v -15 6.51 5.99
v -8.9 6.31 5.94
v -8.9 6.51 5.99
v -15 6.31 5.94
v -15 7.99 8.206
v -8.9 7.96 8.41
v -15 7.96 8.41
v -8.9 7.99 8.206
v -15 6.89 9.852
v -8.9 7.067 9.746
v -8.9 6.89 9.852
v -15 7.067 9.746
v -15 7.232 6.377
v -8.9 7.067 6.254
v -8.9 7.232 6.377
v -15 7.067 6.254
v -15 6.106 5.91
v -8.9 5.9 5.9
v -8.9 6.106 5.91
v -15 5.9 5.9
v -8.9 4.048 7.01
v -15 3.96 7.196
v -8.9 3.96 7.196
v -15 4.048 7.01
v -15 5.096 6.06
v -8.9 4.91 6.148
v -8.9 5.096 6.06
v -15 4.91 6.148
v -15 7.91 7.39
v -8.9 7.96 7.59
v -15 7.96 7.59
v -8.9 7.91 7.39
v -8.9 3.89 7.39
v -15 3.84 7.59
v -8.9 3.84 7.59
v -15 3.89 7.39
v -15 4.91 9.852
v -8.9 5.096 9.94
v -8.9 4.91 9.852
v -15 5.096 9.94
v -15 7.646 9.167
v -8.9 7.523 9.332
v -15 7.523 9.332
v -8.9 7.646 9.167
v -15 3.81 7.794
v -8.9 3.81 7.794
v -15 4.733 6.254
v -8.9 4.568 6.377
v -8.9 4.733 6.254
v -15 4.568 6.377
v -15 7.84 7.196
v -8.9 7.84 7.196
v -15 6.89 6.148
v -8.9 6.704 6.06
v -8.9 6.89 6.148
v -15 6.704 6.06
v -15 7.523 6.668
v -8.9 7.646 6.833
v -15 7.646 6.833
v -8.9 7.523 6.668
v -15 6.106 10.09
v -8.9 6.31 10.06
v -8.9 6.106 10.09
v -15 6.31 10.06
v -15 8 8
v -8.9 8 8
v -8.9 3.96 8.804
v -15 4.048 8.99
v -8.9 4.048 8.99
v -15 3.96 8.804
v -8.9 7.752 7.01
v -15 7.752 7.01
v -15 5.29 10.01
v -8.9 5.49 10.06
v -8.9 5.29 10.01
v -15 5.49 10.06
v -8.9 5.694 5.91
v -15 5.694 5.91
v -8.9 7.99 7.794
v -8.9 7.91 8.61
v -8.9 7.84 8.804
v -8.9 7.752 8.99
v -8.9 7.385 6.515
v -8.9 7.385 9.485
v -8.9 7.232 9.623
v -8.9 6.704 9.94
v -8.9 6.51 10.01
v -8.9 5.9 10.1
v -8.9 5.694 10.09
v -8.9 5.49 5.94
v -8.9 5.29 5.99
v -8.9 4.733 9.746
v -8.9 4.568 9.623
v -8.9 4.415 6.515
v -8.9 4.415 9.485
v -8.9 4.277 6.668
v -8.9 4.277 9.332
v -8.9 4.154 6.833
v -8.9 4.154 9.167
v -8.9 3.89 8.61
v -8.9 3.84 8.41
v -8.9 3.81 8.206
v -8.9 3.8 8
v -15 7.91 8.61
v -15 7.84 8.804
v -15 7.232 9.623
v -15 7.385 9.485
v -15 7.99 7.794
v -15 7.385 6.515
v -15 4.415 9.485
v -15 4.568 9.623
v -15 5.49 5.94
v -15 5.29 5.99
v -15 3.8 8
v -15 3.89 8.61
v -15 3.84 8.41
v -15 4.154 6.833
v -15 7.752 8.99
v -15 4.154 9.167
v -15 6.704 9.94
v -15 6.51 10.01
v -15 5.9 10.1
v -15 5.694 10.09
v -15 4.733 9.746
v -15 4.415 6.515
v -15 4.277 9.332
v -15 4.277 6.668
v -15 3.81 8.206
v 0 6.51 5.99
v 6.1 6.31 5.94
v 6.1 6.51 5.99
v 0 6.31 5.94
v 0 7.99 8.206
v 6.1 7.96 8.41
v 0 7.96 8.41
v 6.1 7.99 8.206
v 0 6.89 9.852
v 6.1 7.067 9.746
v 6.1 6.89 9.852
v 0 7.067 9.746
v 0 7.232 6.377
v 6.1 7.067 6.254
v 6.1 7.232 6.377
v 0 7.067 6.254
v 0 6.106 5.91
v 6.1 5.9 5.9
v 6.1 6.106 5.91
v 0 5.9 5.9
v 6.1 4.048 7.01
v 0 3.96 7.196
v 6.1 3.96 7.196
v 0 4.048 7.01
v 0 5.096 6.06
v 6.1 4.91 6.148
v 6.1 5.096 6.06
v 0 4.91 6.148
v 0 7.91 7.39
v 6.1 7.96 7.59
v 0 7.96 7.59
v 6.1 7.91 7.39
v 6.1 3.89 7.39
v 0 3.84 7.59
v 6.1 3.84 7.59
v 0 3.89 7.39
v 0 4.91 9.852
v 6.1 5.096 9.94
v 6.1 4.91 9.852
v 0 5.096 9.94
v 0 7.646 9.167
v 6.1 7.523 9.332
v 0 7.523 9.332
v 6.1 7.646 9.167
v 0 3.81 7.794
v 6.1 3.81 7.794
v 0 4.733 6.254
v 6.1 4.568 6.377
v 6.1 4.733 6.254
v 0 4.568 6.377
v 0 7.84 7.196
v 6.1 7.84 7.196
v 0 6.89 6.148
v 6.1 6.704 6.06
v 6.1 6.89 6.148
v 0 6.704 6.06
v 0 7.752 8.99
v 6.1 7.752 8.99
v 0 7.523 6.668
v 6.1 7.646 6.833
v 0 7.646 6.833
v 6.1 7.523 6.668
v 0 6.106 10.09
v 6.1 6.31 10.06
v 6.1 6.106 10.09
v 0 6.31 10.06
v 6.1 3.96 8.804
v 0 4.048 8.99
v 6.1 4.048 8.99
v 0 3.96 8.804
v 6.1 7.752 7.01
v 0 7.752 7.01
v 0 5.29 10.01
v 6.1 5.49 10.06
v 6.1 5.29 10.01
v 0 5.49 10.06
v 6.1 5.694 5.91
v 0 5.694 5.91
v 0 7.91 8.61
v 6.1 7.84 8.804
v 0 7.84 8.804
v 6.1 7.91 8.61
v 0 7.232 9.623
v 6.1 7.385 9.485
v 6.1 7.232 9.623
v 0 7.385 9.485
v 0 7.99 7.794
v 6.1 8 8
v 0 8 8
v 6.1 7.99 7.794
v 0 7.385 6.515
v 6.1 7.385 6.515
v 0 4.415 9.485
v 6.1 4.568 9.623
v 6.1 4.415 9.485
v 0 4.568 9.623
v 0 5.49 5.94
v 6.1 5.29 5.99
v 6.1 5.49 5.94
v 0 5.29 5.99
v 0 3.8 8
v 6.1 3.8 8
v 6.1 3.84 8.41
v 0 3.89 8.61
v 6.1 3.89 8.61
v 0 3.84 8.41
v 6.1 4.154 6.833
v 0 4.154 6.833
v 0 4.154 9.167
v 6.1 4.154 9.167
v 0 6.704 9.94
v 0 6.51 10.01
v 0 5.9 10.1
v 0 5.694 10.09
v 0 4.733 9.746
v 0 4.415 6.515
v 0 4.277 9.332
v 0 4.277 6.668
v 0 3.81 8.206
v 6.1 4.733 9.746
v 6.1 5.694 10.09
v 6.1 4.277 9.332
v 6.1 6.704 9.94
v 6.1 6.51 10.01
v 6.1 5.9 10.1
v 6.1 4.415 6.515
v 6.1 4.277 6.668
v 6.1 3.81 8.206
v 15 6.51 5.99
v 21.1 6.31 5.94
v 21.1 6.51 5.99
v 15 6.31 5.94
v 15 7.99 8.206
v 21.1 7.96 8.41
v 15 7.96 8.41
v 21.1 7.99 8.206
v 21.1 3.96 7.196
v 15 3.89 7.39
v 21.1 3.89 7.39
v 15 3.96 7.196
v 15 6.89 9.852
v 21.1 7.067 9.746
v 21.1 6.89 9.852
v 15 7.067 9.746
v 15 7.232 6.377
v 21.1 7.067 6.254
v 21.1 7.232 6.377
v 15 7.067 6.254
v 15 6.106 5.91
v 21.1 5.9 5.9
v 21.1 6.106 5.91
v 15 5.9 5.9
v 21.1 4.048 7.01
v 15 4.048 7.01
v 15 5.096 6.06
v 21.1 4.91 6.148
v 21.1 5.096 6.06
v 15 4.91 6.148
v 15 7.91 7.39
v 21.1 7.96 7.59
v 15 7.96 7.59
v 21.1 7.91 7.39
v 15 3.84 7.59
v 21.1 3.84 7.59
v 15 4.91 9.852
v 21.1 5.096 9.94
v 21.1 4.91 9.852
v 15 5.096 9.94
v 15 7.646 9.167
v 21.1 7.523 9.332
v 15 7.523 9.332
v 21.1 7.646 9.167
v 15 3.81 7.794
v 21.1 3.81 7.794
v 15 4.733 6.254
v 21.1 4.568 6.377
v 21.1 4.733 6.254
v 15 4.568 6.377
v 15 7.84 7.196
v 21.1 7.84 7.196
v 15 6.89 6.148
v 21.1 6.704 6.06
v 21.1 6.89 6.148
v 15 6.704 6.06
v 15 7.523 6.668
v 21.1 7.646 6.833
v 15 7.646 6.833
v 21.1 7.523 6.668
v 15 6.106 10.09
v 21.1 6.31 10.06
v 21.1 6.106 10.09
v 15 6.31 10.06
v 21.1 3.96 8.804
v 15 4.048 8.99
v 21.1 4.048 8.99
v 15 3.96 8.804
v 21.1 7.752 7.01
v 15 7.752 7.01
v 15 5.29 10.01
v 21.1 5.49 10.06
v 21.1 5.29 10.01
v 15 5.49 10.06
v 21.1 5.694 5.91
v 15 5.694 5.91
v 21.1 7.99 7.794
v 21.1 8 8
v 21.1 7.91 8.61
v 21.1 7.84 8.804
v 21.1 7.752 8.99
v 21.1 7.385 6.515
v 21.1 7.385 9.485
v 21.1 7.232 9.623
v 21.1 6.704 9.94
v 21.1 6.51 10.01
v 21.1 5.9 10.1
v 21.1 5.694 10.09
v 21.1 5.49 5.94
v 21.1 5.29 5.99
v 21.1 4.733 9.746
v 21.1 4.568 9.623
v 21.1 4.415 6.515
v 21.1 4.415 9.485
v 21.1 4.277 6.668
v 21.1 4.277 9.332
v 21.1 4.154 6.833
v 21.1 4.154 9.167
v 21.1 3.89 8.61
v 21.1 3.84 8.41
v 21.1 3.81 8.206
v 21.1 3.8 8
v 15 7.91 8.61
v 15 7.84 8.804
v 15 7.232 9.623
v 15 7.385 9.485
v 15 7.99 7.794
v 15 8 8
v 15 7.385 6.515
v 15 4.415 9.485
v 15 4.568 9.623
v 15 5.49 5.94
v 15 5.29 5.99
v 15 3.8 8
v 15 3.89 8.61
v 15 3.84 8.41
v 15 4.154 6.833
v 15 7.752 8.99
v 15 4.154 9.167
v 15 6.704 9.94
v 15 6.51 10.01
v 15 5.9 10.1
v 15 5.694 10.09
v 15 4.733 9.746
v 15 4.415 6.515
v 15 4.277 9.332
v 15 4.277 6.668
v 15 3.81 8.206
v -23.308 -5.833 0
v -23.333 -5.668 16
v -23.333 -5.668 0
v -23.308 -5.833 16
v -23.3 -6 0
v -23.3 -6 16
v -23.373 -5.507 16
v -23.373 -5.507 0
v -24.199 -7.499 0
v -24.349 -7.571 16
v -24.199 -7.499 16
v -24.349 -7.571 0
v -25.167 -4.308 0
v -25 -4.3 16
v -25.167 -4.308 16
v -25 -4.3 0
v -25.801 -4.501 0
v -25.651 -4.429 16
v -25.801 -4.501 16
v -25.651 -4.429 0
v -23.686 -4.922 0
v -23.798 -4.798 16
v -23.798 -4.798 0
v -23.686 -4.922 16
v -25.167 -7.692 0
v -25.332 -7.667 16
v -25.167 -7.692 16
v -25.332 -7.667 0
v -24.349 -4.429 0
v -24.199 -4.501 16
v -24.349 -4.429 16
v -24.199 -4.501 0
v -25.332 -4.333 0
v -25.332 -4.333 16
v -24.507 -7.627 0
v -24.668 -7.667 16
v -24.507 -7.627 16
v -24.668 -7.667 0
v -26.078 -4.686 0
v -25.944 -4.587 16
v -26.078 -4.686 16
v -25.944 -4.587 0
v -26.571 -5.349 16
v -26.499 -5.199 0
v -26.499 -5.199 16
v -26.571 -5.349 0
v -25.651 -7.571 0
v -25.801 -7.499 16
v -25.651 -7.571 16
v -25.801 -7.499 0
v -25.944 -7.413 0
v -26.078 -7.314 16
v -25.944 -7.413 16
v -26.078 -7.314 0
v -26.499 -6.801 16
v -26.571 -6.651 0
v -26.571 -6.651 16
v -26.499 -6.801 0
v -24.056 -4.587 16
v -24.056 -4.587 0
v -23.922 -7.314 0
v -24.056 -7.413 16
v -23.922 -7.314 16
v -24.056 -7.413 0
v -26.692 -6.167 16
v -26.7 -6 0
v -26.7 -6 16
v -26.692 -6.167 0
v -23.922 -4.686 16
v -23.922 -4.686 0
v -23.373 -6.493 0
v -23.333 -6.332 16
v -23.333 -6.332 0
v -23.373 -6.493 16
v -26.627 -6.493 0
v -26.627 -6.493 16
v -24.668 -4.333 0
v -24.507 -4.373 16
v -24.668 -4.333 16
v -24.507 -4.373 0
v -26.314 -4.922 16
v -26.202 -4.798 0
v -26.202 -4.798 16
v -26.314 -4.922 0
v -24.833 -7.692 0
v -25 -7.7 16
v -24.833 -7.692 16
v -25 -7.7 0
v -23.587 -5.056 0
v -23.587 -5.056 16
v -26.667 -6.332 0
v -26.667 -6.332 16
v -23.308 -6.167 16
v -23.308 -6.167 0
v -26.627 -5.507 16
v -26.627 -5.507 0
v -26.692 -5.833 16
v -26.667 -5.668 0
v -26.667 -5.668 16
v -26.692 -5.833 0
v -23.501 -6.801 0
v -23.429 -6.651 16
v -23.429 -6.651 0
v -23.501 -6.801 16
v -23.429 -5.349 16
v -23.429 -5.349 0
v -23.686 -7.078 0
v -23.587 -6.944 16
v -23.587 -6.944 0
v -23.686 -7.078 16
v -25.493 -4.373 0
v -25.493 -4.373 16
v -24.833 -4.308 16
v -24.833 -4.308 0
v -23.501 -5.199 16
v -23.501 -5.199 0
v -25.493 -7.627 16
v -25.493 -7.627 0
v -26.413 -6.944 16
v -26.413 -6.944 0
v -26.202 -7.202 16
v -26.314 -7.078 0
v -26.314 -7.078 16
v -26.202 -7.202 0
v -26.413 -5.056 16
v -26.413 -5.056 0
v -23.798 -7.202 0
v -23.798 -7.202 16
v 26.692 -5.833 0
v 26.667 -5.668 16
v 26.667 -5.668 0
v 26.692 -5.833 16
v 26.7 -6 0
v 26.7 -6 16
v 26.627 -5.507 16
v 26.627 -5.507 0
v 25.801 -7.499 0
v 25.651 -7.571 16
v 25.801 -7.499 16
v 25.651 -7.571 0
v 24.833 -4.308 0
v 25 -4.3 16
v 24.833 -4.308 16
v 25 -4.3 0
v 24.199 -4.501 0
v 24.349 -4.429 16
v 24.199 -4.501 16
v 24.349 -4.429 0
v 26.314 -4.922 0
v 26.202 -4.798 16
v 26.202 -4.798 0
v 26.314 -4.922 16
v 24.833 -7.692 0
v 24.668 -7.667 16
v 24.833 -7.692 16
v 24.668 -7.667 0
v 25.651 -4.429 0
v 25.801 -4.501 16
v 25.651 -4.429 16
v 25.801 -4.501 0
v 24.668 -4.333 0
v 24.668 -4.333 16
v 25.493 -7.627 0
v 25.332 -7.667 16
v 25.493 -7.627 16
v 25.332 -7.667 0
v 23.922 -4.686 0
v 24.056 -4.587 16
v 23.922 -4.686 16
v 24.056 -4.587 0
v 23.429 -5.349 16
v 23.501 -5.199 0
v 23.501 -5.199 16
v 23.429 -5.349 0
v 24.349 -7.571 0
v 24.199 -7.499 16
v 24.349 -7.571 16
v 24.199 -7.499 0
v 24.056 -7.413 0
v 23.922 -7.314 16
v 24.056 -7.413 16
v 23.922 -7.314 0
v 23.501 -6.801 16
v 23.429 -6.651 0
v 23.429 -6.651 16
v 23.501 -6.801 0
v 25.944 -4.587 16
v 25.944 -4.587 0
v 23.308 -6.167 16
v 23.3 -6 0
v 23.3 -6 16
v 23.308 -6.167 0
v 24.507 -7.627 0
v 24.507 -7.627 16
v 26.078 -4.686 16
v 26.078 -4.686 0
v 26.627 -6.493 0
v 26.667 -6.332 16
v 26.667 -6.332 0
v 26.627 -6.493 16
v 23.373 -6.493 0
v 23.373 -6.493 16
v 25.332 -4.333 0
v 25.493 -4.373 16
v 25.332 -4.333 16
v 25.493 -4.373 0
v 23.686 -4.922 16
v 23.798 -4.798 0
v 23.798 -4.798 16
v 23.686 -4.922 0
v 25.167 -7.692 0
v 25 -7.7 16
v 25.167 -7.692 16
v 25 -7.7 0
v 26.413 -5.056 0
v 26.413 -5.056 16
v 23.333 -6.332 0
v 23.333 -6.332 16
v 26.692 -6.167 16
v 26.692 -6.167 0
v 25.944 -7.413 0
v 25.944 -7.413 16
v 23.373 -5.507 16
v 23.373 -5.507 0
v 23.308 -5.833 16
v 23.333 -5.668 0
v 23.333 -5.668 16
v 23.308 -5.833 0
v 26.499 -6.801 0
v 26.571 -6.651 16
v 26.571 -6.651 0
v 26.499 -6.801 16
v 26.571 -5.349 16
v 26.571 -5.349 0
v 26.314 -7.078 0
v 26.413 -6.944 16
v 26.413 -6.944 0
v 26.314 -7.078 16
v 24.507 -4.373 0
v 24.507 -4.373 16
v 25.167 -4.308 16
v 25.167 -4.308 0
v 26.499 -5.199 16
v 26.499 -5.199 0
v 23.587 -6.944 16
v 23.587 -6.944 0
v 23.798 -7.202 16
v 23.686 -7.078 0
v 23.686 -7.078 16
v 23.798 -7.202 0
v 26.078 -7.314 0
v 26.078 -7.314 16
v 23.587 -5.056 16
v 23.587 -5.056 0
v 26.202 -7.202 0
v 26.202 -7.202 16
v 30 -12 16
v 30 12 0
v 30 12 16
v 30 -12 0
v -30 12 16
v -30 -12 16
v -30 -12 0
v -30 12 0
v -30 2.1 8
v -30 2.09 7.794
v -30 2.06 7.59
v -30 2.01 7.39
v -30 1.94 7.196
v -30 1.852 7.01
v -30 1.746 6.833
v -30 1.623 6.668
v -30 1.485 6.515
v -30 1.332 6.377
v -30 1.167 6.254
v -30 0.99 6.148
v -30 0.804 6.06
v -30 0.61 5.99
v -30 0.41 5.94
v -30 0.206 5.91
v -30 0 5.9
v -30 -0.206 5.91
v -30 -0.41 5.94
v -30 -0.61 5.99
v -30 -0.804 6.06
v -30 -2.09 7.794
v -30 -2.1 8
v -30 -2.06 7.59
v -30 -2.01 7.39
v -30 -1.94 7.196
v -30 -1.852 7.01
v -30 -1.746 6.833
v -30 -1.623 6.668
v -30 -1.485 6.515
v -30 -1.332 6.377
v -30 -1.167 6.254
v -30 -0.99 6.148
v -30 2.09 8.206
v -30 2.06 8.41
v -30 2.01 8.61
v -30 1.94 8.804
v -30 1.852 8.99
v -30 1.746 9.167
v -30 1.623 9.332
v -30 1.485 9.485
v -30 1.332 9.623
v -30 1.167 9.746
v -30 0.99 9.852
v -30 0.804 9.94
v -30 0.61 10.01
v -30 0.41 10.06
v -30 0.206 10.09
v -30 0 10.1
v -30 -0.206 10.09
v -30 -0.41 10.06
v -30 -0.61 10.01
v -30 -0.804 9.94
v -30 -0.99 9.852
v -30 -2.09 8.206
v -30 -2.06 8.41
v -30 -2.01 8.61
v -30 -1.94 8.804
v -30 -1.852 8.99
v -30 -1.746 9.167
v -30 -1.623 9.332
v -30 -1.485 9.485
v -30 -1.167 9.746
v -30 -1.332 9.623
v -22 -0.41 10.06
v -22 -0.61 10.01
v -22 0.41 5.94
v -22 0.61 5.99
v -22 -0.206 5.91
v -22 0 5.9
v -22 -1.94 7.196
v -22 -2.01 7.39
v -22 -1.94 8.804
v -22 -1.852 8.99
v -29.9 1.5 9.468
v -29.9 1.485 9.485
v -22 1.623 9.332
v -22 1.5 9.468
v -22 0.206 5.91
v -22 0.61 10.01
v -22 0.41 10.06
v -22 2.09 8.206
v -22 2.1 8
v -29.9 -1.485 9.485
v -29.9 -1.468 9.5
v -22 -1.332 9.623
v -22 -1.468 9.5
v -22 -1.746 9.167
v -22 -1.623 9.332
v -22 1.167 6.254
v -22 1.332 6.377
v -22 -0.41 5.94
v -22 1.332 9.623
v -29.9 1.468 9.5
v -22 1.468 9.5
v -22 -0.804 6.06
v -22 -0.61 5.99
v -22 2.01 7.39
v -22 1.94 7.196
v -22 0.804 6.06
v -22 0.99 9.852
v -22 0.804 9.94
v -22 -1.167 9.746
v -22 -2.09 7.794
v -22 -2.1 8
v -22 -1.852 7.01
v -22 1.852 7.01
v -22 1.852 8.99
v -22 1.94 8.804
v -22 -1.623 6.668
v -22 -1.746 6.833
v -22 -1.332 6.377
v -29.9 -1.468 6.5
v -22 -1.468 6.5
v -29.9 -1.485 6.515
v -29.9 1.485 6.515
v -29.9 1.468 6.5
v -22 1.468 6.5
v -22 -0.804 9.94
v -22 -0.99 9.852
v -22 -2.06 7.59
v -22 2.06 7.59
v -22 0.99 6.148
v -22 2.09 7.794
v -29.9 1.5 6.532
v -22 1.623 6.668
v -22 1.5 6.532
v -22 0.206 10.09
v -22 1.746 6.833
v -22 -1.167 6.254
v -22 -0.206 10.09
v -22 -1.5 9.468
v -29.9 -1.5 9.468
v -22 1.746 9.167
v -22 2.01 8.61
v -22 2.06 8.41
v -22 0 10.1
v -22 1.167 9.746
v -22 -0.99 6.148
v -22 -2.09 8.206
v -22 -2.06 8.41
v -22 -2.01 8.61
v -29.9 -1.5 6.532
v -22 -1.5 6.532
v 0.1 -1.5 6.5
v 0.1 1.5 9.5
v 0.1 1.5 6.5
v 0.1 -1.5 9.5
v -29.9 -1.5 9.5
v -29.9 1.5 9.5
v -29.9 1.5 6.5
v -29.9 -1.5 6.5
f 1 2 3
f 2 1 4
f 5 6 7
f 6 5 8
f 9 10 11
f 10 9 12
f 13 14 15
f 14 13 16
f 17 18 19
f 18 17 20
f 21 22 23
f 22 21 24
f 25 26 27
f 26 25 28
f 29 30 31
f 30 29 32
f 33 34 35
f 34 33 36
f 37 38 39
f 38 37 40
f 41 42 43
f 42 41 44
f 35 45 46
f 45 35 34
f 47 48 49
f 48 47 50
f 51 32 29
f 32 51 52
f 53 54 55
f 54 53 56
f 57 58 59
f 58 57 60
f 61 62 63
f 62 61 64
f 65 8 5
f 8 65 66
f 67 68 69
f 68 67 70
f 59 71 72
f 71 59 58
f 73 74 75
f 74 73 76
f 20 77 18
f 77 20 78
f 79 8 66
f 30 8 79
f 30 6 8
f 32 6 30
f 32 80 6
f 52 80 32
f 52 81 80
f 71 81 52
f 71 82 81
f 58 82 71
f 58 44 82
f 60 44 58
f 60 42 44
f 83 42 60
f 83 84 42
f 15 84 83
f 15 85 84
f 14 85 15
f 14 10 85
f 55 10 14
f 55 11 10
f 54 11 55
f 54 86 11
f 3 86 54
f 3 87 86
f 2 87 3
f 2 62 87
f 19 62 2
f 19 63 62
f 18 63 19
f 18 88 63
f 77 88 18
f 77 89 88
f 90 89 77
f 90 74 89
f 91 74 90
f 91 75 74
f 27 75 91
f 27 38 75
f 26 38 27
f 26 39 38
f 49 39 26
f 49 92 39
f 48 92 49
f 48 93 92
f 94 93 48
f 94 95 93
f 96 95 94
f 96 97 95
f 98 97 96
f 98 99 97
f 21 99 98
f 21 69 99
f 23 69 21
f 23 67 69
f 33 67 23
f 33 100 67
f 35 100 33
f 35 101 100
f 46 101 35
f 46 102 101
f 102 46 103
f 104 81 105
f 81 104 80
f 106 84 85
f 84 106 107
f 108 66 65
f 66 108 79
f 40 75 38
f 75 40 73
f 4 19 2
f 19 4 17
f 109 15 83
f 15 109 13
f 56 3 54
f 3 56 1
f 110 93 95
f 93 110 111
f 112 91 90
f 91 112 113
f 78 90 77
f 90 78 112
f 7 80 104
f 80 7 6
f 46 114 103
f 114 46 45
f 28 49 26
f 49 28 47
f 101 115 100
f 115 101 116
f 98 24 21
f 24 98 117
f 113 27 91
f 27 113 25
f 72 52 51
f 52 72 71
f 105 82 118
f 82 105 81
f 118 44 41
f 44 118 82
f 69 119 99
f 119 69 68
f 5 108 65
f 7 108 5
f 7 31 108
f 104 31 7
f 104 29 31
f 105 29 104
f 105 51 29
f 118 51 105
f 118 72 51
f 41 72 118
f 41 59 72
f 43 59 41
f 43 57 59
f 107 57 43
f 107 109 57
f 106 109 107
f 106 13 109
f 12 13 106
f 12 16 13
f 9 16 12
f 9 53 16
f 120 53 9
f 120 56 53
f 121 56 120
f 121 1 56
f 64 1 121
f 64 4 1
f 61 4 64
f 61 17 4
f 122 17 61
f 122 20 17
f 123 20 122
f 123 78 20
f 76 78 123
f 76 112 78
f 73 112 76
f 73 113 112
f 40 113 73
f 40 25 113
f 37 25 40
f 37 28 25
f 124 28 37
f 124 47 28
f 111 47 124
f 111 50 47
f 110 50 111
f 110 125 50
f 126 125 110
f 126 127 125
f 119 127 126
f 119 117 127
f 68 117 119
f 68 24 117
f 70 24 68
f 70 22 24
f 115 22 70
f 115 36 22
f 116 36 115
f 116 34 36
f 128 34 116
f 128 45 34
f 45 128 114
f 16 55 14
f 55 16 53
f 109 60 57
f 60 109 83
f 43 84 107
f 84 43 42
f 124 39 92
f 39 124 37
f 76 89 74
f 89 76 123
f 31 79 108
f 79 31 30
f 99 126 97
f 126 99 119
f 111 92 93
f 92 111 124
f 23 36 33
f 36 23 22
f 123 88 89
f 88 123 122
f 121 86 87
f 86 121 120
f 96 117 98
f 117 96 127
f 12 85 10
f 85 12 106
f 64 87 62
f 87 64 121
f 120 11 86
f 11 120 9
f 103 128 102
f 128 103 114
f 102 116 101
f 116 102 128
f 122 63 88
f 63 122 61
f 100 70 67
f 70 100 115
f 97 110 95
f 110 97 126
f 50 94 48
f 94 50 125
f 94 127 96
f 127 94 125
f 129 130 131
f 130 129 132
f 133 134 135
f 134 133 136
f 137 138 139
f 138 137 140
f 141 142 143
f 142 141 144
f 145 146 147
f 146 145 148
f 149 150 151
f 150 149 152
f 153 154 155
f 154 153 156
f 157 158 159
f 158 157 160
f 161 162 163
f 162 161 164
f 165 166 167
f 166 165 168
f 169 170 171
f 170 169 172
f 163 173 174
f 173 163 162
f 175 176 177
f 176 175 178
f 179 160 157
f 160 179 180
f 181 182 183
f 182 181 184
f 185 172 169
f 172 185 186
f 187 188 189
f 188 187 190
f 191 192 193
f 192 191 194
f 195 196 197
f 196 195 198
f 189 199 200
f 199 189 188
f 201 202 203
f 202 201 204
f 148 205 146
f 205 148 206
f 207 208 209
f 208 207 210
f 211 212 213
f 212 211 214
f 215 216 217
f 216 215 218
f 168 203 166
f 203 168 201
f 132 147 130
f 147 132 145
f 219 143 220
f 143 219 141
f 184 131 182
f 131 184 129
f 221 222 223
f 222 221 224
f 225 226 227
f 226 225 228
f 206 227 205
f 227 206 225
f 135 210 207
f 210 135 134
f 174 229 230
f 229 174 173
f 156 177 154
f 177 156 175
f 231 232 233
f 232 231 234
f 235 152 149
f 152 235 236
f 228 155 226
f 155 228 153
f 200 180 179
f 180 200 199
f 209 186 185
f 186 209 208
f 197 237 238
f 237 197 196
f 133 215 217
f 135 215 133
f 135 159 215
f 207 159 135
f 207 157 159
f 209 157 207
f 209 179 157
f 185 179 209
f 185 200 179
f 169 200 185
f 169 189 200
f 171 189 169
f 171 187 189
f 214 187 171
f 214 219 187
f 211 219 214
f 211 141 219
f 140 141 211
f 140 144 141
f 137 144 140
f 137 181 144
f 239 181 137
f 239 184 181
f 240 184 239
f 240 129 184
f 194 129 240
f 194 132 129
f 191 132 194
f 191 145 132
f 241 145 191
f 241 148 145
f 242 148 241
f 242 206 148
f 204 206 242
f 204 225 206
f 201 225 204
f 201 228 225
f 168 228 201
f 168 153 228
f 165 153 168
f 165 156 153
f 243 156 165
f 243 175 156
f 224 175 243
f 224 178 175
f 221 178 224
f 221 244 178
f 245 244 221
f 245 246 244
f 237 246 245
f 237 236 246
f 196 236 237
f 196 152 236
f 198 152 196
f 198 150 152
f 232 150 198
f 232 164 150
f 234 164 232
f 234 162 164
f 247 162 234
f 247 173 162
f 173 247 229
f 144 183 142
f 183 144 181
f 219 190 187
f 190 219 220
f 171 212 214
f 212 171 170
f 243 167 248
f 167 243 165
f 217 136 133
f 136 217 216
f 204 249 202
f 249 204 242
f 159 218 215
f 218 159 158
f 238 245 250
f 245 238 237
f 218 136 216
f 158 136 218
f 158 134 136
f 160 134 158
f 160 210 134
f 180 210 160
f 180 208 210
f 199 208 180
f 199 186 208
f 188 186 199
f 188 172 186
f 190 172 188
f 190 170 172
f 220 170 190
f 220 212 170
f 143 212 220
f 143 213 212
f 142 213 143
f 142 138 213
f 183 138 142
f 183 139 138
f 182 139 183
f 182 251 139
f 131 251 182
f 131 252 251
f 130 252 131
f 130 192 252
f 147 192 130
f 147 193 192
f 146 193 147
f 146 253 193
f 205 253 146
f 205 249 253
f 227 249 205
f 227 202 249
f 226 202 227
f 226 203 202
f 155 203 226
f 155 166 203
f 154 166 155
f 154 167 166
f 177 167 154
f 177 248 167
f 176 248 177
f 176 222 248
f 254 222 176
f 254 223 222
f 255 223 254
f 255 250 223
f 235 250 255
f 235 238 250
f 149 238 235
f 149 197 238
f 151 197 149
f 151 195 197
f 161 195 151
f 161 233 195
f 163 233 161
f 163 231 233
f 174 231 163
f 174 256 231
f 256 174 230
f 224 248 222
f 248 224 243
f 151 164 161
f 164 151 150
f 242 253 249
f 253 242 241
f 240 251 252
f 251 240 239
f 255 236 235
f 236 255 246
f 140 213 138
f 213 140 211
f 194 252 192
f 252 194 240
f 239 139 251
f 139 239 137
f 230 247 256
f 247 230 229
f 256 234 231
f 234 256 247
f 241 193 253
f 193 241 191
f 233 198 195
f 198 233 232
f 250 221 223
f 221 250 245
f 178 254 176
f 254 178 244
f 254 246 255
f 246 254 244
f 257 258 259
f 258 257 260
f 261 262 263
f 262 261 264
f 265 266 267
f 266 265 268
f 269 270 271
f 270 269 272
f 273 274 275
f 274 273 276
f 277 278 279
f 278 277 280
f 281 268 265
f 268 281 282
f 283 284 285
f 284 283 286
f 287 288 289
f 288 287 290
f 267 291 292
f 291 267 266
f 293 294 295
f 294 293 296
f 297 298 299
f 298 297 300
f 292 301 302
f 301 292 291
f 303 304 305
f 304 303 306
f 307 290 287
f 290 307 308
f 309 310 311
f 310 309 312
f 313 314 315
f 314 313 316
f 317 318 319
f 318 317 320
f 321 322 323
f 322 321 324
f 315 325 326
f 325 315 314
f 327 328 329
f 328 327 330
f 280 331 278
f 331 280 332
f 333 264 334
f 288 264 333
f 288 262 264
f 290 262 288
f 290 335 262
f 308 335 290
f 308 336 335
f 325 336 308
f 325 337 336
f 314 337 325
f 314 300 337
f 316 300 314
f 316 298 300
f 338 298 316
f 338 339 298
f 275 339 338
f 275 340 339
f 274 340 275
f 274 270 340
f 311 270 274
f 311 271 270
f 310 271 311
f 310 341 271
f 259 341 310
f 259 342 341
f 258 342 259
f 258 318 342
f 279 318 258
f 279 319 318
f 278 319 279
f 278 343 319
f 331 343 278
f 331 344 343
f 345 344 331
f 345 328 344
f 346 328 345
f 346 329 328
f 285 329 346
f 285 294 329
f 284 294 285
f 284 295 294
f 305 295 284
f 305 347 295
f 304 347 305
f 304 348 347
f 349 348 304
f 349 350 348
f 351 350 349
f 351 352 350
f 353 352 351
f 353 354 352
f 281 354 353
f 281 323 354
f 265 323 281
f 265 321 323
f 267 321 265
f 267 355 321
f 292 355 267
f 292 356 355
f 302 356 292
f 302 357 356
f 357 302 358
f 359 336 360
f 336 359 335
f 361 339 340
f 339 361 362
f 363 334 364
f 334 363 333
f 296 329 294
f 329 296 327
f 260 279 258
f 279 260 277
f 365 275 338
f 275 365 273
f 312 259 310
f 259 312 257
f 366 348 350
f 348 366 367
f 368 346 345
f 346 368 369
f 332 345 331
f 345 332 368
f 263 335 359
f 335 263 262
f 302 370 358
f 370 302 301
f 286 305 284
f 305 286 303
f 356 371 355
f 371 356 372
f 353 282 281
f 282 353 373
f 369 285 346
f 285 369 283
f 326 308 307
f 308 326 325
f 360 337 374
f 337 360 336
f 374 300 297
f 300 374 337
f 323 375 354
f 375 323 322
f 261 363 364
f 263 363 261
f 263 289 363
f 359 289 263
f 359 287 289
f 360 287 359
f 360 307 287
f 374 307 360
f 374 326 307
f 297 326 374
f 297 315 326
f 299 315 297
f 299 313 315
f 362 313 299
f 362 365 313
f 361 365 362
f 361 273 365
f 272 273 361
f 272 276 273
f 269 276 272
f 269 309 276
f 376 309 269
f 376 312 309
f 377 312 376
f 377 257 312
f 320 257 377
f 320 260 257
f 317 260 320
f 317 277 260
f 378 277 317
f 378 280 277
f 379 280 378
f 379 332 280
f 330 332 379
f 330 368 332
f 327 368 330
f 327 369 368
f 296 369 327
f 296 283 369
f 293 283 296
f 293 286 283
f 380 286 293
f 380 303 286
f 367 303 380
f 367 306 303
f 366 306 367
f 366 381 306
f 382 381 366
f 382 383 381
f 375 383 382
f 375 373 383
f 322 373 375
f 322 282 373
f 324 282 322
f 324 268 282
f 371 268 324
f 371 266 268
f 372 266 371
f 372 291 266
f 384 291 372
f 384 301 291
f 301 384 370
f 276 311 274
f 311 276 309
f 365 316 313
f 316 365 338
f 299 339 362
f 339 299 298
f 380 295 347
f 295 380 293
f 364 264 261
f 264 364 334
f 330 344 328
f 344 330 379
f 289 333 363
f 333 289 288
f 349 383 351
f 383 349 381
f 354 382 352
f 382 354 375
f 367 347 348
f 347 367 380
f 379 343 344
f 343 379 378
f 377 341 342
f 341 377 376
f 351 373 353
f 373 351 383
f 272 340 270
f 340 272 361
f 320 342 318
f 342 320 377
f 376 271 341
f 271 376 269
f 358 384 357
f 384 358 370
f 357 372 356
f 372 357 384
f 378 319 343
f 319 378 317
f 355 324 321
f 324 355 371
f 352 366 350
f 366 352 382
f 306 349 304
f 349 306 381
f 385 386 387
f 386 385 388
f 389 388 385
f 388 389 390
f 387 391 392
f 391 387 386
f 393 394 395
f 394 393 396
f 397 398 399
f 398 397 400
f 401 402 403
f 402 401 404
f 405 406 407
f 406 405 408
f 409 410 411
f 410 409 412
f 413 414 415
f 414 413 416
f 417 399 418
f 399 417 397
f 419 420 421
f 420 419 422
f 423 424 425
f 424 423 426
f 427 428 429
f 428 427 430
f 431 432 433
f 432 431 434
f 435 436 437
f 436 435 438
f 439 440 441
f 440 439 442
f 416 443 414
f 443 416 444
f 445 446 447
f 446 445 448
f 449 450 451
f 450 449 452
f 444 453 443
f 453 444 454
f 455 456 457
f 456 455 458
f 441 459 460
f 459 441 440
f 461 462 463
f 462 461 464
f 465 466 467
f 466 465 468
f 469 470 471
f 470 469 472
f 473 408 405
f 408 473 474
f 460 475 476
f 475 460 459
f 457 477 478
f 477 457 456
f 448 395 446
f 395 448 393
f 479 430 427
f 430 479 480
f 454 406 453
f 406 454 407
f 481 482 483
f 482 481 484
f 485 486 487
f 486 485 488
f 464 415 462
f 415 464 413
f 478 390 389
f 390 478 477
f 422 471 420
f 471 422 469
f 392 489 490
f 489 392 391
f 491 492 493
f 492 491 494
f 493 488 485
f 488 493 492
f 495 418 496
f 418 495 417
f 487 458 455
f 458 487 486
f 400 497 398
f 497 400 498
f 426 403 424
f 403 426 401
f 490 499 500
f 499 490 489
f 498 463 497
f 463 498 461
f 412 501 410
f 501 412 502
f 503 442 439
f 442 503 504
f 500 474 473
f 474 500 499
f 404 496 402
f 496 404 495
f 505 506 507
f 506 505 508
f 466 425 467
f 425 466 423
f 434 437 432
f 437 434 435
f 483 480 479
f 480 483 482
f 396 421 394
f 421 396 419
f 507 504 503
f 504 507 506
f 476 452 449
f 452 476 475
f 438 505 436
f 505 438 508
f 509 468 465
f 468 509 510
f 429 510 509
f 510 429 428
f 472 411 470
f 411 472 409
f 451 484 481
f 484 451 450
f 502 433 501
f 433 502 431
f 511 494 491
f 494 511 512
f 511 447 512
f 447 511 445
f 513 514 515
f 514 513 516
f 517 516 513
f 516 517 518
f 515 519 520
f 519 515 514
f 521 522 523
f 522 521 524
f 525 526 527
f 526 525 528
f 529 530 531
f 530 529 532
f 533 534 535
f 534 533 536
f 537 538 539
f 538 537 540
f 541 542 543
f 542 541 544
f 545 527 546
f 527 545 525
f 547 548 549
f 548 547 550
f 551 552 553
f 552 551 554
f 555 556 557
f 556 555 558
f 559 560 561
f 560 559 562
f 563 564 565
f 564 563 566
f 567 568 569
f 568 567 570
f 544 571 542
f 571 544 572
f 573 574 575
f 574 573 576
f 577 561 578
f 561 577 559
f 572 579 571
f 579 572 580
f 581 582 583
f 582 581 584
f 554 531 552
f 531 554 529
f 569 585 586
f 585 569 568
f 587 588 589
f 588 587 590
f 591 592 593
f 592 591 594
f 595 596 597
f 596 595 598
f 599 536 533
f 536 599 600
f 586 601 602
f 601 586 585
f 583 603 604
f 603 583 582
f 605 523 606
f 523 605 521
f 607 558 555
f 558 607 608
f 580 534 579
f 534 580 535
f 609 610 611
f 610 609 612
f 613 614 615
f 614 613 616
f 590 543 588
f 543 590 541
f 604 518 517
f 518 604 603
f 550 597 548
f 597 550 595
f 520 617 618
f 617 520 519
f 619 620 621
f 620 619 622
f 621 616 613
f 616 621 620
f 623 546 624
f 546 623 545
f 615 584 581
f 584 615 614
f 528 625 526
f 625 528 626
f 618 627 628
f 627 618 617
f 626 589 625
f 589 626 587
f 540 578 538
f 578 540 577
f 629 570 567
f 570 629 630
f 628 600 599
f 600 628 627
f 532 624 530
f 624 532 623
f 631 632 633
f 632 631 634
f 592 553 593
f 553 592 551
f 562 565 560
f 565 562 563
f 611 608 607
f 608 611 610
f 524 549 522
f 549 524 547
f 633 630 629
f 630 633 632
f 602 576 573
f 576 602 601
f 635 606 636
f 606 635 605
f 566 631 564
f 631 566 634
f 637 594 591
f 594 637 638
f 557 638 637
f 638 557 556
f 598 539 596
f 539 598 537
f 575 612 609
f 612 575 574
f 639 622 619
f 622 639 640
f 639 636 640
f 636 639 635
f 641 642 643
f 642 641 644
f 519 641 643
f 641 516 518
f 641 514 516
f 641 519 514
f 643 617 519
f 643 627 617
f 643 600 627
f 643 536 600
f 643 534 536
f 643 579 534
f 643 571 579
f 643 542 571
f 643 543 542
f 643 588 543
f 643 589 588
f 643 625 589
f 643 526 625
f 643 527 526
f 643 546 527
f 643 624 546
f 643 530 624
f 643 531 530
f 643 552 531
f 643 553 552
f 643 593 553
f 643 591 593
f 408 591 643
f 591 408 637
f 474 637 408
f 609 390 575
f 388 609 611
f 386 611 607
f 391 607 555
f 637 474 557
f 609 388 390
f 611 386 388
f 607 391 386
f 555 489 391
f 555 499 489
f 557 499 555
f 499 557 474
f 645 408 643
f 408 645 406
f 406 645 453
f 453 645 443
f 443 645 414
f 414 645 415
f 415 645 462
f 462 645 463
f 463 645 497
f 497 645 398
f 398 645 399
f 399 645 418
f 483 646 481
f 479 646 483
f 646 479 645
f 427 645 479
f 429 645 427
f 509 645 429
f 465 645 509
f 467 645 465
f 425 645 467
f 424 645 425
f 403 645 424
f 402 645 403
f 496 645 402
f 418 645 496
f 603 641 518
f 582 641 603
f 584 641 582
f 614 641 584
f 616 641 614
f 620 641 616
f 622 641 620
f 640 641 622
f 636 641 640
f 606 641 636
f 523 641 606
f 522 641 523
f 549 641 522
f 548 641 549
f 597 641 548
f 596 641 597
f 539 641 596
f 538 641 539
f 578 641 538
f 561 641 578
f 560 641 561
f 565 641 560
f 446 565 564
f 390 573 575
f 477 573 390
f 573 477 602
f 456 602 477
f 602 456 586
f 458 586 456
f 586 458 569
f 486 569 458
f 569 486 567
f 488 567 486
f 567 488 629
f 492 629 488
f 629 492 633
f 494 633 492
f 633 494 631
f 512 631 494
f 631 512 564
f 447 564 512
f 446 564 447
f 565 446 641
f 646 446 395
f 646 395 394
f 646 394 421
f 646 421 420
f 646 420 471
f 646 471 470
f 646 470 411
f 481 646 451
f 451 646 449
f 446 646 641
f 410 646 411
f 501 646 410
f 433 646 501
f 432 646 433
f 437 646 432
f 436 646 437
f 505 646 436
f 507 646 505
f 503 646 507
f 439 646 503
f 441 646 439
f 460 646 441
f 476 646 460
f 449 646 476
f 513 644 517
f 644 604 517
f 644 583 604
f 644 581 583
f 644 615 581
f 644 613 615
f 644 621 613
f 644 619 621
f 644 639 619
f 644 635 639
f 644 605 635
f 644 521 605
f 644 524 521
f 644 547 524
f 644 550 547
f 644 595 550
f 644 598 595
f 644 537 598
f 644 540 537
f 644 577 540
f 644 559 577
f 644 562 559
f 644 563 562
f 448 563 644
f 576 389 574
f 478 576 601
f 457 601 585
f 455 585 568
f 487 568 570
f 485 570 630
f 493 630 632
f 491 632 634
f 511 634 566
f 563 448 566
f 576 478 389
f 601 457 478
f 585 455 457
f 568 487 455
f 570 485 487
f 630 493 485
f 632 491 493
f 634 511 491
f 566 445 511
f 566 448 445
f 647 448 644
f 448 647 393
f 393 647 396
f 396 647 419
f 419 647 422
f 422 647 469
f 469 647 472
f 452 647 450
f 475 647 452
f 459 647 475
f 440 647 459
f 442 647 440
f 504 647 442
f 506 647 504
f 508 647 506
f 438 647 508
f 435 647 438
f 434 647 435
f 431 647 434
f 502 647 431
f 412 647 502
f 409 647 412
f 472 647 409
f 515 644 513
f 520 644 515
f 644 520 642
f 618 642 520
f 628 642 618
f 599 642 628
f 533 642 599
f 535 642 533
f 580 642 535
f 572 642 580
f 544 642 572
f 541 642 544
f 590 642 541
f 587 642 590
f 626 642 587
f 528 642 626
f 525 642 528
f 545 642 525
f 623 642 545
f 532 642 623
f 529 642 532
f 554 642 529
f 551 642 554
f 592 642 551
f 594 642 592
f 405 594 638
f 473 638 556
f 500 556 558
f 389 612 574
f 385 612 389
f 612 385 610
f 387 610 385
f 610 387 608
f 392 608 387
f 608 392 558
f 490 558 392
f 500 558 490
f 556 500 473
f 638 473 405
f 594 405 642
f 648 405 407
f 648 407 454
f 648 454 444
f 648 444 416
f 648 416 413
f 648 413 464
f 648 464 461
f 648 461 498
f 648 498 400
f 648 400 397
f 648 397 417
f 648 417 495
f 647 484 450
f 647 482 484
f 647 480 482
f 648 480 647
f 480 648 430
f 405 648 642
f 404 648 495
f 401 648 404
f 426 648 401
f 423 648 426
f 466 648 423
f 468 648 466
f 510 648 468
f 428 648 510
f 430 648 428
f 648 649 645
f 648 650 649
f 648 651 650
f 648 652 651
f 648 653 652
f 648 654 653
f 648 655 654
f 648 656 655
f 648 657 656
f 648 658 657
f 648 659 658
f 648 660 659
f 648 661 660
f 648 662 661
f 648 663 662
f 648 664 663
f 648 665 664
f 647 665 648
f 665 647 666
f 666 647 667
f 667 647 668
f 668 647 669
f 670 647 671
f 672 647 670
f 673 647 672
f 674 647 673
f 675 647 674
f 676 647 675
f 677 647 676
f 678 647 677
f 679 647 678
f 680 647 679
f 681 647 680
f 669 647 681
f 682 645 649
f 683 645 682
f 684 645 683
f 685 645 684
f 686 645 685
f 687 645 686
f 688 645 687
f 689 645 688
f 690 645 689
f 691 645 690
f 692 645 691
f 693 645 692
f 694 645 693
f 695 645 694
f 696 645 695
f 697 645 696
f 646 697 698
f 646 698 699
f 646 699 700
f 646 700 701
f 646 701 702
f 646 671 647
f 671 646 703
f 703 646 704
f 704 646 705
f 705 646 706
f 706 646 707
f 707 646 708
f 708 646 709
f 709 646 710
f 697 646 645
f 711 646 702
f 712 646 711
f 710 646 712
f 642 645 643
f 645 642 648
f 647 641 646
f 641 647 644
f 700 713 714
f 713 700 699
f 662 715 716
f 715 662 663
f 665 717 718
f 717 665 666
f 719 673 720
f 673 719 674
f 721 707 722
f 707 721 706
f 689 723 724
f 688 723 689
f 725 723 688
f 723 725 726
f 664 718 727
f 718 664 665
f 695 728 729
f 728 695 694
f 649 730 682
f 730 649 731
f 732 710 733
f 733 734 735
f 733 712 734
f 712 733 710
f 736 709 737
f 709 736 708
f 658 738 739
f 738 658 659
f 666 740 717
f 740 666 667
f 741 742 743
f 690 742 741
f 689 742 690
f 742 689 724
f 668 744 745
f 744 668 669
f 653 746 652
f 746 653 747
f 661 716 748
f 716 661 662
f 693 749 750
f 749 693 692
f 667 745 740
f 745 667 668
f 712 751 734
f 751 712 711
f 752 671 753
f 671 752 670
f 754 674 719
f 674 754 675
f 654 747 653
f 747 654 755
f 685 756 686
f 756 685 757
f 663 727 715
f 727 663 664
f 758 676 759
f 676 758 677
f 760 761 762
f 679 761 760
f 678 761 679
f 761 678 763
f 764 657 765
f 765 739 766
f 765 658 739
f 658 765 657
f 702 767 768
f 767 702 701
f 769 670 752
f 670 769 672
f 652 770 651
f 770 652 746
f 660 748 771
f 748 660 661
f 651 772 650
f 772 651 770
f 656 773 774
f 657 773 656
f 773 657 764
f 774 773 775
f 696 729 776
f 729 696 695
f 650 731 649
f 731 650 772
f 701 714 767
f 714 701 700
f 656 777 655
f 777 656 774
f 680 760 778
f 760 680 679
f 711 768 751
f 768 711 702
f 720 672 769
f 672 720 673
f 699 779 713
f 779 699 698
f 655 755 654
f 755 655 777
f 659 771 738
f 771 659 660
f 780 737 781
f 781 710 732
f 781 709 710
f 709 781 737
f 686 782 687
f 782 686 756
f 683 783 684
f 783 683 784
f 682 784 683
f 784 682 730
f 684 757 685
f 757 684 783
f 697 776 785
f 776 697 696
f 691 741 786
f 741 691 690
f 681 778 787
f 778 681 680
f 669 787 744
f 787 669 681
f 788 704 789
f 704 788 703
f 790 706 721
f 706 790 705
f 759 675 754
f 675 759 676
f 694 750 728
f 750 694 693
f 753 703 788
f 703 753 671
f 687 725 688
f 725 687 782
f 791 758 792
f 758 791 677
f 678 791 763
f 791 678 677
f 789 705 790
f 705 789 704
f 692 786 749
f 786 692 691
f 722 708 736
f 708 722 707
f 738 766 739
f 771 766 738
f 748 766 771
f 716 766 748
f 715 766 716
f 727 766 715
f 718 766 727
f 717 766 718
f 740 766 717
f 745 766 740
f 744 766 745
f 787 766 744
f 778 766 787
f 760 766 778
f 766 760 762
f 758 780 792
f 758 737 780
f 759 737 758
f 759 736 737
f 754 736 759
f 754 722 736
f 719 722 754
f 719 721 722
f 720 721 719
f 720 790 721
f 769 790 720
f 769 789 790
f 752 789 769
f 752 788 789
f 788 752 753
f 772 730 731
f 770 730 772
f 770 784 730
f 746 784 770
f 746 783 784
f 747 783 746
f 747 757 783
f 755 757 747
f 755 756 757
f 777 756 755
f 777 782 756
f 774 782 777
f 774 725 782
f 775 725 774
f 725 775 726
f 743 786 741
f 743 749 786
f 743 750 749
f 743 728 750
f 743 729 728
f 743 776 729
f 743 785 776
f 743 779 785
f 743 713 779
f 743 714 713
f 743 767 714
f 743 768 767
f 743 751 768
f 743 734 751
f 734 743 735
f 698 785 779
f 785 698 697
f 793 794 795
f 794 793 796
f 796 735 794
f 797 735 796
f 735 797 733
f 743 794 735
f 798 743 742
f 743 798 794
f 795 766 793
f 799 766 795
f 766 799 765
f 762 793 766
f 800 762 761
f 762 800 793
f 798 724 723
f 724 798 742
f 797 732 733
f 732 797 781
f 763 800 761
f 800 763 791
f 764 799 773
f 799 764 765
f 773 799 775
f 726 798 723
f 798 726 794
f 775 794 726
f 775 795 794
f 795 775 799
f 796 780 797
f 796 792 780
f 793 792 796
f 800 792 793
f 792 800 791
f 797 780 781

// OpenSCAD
// --- Dimensions (mm) ---
block_x = 60;            // Total length of block
block_y = 24;            // Total width of block
block_z = 16;            // Total height of block

channel_dia = 3;         // Diameter of internal channels
inlet_socket_dia = 4.2;  // Diameter of inlet socket
inlet_socket_depth = 8;  // Depth of inlet socket
outlet_socket_dia = 4.2; // Diameter of outlet sockets
outlet_socket_depth = 6; // Depth of outlet sockets

main_channel_length = 15; // Length of main channel from -X end
outlet_x_positions = [-15, 0, 15]; // X positions of the three outlets

screw_hole_dia = 3.4;    // Diameter for M3 screw holes
screw_hole_x = 25;       // X position of screw holes (absolute)
screw_hole_y = -6;       // Y position of screw holes (absolute)

// --- Constants ---
$fn = 64;

// --- Main Block Construction ---
difference() {
    // The main solid block
    translate([-block_x/2, -block_y/2, 0])
        cube([block_x, block_y, block_z]);

    // 1. Inlet Socket (-X face, at y=0, centered on Z)
    // Positioned at x = -30 (the -X face), y = 0, z = 8
    translate([-block_x/2 - 0.1, 0, 8])
        rotate([0, 90, 0])
            cylinder(h = inlet_socket_depth + 0.1, d = inlet_socket_dia);

    // 2. Main Channel (runs from inlet to x = -15)
    // Note: User said "from it [inlet] the main channel runs along X to x=15, where it stops".
    // Since the block is 60mm long (from -30 to 30), and the inlet is at -30,
    // "x=15" relative to the origin means the channel ends at x=15.
    // However, the user also says "Three outlet channels branch off it at x = -15, 0 and 15".
    // This implies the main channel must span from the inlet (-30) to at least x=15.
    translate([-block_x/2 + 0.1, -channel_dia/2, 8 - channel_dia/2])
        cube([main_channel_length + 15, channel_dia, channel_dia]); 
        // Note: The logic above is simplified; let's use a cylinder for the main channel for better flow.
    
    // Re-defining Main Channel as a cylinder for better manifold design
    // It starts at the inlet (-30) and goes to x = 15.
    translate([-block_x/2 + 0.1, 0, 8])
        rotate([0, 90, 0])
            cylinder(h = main_channel_length + 15, d = channel_dia);

    // 3. Outlet Sockets (+Y face)
    // Three outlets at x = -15, 0, 15. They run in +Y direction.
    // They end at the +Y face (y = 12).
    for (ox = outlet_x_positions) {
        translate([ox, block_y/2 - outlet_socket_depth - 0.1, 8])
            rotate([0, 90, 0])
                cylinder(h = outlet_socket_depth + 0.1, d = outlet_socket_dia);
    }

    // 4. Screw Holes (Vertical through-holes)
    // Through the block at x = -25, 25 and y = -6.
    // Since the block is centered, x=-25 and x=25 are within the 60mm range.
    for (sx = [-25, 25]) {
        translate([sx, screw_hole_y, -0.1])
            cylinder(h = block_z + 0.2, d = screw_hole_dia);
    }
}

// Note on geometry: 
// The main channel is modeled as a cylinder along the X axis.
// The outlet sockets are modeled as cylinders along the Y axis.
// The intersection of these cylinders creates the manifold junctions.
